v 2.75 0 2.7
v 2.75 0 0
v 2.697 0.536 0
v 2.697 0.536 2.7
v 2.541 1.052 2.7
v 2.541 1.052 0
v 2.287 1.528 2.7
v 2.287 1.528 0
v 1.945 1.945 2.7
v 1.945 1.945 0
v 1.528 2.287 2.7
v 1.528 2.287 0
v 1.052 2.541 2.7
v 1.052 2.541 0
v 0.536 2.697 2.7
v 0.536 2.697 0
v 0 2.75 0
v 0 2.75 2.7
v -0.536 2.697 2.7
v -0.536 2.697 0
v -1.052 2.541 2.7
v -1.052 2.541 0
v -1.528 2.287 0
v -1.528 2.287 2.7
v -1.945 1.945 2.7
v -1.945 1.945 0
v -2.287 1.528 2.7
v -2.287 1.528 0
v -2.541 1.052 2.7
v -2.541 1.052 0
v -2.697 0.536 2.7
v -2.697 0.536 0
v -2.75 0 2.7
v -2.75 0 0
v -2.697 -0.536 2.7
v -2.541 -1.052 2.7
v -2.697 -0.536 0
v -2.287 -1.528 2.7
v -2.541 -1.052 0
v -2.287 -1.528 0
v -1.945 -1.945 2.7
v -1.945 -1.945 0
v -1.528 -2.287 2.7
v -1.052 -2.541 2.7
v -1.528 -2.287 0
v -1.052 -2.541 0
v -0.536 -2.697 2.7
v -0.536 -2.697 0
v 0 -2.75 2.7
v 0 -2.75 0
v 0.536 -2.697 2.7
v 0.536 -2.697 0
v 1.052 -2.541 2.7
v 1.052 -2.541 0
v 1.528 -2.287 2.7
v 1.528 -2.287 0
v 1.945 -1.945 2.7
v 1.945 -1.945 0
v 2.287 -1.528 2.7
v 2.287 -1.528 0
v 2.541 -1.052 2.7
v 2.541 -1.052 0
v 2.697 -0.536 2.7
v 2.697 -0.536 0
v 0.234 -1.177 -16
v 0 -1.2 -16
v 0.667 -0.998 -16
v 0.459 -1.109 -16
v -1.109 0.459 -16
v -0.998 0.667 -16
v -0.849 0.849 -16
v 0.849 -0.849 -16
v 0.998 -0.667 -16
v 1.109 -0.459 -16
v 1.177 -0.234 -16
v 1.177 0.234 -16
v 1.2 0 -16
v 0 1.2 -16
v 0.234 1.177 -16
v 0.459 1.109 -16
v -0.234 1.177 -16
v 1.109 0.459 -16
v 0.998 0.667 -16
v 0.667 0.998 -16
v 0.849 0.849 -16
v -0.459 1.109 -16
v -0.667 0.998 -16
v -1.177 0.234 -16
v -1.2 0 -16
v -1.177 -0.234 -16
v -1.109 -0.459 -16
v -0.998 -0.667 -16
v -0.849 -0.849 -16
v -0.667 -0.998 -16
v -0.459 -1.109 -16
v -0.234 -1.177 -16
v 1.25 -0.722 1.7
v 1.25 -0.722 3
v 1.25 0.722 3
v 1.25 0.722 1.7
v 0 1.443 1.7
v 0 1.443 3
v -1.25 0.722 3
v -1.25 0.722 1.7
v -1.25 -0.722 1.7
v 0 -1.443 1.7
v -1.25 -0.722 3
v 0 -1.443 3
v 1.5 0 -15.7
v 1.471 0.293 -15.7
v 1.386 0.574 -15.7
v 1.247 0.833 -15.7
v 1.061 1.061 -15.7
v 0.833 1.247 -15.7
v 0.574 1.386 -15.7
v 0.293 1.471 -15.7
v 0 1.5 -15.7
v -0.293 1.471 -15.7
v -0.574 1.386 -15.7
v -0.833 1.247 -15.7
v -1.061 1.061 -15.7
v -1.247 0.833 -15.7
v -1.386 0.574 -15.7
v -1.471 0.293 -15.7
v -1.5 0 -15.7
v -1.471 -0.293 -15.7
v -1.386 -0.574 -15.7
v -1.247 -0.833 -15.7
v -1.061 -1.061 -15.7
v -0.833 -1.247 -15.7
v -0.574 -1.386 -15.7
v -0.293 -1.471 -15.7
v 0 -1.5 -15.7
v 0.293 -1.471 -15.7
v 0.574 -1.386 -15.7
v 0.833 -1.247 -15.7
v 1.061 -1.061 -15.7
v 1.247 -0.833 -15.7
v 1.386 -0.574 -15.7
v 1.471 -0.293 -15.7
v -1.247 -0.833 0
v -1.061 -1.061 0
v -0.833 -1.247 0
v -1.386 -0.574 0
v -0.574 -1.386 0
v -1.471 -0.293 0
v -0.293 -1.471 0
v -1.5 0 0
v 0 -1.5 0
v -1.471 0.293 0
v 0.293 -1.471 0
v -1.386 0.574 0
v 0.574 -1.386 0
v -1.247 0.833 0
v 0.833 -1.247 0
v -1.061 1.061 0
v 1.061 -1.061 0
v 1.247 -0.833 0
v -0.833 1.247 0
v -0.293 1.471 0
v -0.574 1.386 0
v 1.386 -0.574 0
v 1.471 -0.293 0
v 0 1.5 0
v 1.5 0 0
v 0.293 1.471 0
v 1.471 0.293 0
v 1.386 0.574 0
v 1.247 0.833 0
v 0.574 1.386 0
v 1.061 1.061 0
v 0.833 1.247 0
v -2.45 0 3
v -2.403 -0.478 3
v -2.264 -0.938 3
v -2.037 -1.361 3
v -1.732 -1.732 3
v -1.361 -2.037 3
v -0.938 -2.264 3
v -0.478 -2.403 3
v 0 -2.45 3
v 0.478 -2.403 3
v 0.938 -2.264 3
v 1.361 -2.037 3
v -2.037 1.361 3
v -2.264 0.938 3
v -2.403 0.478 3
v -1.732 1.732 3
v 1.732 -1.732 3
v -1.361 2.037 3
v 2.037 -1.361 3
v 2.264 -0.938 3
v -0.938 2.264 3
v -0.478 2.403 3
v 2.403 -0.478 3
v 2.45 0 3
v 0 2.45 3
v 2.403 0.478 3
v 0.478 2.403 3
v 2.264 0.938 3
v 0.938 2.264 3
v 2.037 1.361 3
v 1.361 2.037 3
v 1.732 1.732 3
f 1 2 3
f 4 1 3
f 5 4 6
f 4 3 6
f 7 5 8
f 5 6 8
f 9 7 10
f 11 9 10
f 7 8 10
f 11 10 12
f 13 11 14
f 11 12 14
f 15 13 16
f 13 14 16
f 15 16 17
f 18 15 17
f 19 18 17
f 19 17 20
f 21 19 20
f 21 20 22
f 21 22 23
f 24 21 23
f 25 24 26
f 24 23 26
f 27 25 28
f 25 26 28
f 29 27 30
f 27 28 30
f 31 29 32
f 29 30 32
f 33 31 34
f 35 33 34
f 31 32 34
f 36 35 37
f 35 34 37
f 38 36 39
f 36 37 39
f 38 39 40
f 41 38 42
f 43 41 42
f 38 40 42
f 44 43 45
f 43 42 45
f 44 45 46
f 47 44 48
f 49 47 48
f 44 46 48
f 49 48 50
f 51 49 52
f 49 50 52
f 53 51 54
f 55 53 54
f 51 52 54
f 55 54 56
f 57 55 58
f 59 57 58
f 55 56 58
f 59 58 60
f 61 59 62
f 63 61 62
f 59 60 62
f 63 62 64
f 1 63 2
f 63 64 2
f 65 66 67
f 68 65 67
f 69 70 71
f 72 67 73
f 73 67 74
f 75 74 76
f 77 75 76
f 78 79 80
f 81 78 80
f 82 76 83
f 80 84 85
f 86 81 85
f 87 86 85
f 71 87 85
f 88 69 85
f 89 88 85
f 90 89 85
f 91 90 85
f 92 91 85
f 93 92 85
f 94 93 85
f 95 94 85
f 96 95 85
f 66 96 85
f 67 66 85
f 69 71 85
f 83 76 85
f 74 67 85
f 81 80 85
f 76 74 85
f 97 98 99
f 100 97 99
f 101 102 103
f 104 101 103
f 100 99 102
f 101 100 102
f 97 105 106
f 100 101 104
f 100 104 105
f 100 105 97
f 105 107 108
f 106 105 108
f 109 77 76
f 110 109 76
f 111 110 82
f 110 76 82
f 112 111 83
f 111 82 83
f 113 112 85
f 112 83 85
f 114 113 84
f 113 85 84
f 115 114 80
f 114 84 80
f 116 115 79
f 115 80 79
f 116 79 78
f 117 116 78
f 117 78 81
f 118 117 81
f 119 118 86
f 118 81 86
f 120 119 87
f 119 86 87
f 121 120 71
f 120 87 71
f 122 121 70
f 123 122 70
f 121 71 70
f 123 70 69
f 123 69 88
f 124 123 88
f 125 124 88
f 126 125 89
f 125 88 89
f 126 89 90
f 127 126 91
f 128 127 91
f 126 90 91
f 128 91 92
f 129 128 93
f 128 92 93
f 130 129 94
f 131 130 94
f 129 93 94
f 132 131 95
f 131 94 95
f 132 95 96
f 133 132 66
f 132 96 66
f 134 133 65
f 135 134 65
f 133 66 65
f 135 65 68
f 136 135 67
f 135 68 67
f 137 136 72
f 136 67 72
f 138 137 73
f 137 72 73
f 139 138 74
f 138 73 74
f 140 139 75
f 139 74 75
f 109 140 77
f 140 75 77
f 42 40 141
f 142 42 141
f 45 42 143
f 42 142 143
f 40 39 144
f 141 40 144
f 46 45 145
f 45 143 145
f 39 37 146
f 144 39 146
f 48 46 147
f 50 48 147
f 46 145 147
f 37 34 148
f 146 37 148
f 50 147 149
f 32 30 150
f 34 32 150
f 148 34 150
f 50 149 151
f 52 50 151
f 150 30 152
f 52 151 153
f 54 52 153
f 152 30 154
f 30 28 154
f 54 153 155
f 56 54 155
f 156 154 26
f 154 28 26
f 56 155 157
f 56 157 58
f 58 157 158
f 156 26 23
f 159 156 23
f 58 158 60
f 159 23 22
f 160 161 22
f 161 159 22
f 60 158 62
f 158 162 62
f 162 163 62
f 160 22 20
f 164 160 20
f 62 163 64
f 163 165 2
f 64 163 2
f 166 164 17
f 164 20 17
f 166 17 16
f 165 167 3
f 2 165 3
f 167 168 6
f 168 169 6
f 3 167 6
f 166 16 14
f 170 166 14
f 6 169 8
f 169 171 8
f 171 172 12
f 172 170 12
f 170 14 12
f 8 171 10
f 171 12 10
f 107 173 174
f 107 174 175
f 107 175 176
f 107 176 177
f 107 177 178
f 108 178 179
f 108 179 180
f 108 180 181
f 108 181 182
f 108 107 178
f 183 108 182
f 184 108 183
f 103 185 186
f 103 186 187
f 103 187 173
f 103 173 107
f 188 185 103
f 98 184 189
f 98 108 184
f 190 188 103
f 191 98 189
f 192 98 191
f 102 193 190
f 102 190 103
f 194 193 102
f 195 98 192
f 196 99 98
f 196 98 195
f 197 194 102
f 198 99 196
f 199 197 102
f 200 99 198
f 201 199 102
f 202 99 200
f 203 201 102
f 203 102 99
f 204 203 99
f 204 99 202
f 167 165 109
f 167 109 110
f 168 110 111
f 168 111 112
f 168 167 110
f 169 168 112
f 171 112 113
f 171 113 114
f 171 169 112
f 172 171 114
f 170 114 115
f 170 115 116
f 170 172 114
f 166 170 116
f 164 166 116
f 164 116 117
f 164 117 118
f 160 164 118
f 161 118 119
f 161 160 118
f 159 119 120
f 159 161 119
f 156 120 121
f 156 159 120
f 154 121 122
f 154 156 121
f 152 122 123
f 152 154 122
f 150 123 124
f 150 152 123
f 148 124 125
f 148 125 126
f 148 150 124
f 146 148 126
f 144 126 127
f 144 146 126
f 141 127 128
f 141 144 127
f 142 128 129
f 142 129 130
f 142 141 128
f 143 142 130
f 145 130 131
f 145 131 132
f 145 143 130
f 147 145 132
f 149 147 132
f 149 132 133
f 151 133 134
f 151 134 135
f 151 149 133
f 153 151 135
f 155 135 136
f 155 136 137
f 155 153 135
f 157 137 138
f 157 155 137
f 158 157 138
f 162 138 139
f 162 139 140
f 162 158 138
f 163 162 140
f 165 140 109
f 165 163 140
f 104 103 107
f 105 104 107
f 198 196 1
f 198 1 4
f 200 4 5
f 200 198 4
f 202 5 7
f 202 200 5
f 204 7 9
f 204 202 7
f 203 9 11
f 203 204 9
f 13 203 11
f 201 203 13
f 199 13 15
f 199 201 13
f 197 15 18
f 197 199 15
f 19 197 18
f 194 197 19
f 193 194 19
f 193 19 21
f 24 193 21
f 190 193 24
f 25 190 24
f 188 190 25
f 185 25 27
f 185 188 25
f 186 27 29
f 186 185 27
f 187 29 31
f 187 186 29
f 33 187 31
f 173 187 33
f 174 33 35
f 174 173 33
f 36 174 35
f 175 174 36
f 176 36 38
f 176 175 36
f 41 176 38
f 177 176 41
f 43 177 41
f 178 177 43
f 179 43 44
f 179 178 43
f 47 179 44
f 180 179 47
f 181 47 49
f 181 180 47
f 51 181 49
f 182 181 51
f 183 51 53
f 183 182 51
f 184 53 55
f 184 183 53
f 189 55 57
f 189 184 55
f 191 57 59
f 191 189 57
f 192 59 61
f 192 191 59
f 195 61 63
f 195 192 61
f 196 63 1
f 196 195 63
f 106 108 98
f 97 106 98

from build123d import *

# Parameters (mm, degrees)
F2_R      = 1.5
F3_DEPTH  = 16
F2_R_2    = 2.75
F3_FACE_R = 1.5
F4_DEPTH  = 3
F5_SIZE   = 0.3
F7_DEPTH  = 1.3


with BuildPart() as f3:
    # F2 (on Top) → F3 (new body)
    with BuildSketch(Plane.XY):
        Circle(F2_R)
    extrude(amount=-F3_DEPTH)

    # F2 (on Top) + F3_face (on face) → F4 (join)
    with BuildSketch(Plane.XY):
        Circle(F2_R_2)
        Circle(F2_R, mode=Mode.SUBTRACT)
    with BuildSketch(Plane.XY):
        Circle(F3_FACE_R)
    extrude(amount=F4_DEPTH)

    # F5
    f5_edges = [f3.edges().sort_by_distance(p)[0] for p in [
        (-1.5, 0, -16),
        (-2.75, 0, 3),
    ]]
    chamfer(f5_edges, length=F5_SIZE)

    # F6 (on face) → F7 (cut)
    with BuildSketch(Plane.XY.offset(3)):
        Polygon((1.25, -0.7216878365), (1.25, 0.7216878365), (0, 1.443375673), (-1.25, 0.7216878365), (-1.25, -0.7216878365), (0, -1.443375673), align=None)
    extrude(amount=-F7_DEPTH, mode=Mode.SUBTRACT)


solid = f3.part
